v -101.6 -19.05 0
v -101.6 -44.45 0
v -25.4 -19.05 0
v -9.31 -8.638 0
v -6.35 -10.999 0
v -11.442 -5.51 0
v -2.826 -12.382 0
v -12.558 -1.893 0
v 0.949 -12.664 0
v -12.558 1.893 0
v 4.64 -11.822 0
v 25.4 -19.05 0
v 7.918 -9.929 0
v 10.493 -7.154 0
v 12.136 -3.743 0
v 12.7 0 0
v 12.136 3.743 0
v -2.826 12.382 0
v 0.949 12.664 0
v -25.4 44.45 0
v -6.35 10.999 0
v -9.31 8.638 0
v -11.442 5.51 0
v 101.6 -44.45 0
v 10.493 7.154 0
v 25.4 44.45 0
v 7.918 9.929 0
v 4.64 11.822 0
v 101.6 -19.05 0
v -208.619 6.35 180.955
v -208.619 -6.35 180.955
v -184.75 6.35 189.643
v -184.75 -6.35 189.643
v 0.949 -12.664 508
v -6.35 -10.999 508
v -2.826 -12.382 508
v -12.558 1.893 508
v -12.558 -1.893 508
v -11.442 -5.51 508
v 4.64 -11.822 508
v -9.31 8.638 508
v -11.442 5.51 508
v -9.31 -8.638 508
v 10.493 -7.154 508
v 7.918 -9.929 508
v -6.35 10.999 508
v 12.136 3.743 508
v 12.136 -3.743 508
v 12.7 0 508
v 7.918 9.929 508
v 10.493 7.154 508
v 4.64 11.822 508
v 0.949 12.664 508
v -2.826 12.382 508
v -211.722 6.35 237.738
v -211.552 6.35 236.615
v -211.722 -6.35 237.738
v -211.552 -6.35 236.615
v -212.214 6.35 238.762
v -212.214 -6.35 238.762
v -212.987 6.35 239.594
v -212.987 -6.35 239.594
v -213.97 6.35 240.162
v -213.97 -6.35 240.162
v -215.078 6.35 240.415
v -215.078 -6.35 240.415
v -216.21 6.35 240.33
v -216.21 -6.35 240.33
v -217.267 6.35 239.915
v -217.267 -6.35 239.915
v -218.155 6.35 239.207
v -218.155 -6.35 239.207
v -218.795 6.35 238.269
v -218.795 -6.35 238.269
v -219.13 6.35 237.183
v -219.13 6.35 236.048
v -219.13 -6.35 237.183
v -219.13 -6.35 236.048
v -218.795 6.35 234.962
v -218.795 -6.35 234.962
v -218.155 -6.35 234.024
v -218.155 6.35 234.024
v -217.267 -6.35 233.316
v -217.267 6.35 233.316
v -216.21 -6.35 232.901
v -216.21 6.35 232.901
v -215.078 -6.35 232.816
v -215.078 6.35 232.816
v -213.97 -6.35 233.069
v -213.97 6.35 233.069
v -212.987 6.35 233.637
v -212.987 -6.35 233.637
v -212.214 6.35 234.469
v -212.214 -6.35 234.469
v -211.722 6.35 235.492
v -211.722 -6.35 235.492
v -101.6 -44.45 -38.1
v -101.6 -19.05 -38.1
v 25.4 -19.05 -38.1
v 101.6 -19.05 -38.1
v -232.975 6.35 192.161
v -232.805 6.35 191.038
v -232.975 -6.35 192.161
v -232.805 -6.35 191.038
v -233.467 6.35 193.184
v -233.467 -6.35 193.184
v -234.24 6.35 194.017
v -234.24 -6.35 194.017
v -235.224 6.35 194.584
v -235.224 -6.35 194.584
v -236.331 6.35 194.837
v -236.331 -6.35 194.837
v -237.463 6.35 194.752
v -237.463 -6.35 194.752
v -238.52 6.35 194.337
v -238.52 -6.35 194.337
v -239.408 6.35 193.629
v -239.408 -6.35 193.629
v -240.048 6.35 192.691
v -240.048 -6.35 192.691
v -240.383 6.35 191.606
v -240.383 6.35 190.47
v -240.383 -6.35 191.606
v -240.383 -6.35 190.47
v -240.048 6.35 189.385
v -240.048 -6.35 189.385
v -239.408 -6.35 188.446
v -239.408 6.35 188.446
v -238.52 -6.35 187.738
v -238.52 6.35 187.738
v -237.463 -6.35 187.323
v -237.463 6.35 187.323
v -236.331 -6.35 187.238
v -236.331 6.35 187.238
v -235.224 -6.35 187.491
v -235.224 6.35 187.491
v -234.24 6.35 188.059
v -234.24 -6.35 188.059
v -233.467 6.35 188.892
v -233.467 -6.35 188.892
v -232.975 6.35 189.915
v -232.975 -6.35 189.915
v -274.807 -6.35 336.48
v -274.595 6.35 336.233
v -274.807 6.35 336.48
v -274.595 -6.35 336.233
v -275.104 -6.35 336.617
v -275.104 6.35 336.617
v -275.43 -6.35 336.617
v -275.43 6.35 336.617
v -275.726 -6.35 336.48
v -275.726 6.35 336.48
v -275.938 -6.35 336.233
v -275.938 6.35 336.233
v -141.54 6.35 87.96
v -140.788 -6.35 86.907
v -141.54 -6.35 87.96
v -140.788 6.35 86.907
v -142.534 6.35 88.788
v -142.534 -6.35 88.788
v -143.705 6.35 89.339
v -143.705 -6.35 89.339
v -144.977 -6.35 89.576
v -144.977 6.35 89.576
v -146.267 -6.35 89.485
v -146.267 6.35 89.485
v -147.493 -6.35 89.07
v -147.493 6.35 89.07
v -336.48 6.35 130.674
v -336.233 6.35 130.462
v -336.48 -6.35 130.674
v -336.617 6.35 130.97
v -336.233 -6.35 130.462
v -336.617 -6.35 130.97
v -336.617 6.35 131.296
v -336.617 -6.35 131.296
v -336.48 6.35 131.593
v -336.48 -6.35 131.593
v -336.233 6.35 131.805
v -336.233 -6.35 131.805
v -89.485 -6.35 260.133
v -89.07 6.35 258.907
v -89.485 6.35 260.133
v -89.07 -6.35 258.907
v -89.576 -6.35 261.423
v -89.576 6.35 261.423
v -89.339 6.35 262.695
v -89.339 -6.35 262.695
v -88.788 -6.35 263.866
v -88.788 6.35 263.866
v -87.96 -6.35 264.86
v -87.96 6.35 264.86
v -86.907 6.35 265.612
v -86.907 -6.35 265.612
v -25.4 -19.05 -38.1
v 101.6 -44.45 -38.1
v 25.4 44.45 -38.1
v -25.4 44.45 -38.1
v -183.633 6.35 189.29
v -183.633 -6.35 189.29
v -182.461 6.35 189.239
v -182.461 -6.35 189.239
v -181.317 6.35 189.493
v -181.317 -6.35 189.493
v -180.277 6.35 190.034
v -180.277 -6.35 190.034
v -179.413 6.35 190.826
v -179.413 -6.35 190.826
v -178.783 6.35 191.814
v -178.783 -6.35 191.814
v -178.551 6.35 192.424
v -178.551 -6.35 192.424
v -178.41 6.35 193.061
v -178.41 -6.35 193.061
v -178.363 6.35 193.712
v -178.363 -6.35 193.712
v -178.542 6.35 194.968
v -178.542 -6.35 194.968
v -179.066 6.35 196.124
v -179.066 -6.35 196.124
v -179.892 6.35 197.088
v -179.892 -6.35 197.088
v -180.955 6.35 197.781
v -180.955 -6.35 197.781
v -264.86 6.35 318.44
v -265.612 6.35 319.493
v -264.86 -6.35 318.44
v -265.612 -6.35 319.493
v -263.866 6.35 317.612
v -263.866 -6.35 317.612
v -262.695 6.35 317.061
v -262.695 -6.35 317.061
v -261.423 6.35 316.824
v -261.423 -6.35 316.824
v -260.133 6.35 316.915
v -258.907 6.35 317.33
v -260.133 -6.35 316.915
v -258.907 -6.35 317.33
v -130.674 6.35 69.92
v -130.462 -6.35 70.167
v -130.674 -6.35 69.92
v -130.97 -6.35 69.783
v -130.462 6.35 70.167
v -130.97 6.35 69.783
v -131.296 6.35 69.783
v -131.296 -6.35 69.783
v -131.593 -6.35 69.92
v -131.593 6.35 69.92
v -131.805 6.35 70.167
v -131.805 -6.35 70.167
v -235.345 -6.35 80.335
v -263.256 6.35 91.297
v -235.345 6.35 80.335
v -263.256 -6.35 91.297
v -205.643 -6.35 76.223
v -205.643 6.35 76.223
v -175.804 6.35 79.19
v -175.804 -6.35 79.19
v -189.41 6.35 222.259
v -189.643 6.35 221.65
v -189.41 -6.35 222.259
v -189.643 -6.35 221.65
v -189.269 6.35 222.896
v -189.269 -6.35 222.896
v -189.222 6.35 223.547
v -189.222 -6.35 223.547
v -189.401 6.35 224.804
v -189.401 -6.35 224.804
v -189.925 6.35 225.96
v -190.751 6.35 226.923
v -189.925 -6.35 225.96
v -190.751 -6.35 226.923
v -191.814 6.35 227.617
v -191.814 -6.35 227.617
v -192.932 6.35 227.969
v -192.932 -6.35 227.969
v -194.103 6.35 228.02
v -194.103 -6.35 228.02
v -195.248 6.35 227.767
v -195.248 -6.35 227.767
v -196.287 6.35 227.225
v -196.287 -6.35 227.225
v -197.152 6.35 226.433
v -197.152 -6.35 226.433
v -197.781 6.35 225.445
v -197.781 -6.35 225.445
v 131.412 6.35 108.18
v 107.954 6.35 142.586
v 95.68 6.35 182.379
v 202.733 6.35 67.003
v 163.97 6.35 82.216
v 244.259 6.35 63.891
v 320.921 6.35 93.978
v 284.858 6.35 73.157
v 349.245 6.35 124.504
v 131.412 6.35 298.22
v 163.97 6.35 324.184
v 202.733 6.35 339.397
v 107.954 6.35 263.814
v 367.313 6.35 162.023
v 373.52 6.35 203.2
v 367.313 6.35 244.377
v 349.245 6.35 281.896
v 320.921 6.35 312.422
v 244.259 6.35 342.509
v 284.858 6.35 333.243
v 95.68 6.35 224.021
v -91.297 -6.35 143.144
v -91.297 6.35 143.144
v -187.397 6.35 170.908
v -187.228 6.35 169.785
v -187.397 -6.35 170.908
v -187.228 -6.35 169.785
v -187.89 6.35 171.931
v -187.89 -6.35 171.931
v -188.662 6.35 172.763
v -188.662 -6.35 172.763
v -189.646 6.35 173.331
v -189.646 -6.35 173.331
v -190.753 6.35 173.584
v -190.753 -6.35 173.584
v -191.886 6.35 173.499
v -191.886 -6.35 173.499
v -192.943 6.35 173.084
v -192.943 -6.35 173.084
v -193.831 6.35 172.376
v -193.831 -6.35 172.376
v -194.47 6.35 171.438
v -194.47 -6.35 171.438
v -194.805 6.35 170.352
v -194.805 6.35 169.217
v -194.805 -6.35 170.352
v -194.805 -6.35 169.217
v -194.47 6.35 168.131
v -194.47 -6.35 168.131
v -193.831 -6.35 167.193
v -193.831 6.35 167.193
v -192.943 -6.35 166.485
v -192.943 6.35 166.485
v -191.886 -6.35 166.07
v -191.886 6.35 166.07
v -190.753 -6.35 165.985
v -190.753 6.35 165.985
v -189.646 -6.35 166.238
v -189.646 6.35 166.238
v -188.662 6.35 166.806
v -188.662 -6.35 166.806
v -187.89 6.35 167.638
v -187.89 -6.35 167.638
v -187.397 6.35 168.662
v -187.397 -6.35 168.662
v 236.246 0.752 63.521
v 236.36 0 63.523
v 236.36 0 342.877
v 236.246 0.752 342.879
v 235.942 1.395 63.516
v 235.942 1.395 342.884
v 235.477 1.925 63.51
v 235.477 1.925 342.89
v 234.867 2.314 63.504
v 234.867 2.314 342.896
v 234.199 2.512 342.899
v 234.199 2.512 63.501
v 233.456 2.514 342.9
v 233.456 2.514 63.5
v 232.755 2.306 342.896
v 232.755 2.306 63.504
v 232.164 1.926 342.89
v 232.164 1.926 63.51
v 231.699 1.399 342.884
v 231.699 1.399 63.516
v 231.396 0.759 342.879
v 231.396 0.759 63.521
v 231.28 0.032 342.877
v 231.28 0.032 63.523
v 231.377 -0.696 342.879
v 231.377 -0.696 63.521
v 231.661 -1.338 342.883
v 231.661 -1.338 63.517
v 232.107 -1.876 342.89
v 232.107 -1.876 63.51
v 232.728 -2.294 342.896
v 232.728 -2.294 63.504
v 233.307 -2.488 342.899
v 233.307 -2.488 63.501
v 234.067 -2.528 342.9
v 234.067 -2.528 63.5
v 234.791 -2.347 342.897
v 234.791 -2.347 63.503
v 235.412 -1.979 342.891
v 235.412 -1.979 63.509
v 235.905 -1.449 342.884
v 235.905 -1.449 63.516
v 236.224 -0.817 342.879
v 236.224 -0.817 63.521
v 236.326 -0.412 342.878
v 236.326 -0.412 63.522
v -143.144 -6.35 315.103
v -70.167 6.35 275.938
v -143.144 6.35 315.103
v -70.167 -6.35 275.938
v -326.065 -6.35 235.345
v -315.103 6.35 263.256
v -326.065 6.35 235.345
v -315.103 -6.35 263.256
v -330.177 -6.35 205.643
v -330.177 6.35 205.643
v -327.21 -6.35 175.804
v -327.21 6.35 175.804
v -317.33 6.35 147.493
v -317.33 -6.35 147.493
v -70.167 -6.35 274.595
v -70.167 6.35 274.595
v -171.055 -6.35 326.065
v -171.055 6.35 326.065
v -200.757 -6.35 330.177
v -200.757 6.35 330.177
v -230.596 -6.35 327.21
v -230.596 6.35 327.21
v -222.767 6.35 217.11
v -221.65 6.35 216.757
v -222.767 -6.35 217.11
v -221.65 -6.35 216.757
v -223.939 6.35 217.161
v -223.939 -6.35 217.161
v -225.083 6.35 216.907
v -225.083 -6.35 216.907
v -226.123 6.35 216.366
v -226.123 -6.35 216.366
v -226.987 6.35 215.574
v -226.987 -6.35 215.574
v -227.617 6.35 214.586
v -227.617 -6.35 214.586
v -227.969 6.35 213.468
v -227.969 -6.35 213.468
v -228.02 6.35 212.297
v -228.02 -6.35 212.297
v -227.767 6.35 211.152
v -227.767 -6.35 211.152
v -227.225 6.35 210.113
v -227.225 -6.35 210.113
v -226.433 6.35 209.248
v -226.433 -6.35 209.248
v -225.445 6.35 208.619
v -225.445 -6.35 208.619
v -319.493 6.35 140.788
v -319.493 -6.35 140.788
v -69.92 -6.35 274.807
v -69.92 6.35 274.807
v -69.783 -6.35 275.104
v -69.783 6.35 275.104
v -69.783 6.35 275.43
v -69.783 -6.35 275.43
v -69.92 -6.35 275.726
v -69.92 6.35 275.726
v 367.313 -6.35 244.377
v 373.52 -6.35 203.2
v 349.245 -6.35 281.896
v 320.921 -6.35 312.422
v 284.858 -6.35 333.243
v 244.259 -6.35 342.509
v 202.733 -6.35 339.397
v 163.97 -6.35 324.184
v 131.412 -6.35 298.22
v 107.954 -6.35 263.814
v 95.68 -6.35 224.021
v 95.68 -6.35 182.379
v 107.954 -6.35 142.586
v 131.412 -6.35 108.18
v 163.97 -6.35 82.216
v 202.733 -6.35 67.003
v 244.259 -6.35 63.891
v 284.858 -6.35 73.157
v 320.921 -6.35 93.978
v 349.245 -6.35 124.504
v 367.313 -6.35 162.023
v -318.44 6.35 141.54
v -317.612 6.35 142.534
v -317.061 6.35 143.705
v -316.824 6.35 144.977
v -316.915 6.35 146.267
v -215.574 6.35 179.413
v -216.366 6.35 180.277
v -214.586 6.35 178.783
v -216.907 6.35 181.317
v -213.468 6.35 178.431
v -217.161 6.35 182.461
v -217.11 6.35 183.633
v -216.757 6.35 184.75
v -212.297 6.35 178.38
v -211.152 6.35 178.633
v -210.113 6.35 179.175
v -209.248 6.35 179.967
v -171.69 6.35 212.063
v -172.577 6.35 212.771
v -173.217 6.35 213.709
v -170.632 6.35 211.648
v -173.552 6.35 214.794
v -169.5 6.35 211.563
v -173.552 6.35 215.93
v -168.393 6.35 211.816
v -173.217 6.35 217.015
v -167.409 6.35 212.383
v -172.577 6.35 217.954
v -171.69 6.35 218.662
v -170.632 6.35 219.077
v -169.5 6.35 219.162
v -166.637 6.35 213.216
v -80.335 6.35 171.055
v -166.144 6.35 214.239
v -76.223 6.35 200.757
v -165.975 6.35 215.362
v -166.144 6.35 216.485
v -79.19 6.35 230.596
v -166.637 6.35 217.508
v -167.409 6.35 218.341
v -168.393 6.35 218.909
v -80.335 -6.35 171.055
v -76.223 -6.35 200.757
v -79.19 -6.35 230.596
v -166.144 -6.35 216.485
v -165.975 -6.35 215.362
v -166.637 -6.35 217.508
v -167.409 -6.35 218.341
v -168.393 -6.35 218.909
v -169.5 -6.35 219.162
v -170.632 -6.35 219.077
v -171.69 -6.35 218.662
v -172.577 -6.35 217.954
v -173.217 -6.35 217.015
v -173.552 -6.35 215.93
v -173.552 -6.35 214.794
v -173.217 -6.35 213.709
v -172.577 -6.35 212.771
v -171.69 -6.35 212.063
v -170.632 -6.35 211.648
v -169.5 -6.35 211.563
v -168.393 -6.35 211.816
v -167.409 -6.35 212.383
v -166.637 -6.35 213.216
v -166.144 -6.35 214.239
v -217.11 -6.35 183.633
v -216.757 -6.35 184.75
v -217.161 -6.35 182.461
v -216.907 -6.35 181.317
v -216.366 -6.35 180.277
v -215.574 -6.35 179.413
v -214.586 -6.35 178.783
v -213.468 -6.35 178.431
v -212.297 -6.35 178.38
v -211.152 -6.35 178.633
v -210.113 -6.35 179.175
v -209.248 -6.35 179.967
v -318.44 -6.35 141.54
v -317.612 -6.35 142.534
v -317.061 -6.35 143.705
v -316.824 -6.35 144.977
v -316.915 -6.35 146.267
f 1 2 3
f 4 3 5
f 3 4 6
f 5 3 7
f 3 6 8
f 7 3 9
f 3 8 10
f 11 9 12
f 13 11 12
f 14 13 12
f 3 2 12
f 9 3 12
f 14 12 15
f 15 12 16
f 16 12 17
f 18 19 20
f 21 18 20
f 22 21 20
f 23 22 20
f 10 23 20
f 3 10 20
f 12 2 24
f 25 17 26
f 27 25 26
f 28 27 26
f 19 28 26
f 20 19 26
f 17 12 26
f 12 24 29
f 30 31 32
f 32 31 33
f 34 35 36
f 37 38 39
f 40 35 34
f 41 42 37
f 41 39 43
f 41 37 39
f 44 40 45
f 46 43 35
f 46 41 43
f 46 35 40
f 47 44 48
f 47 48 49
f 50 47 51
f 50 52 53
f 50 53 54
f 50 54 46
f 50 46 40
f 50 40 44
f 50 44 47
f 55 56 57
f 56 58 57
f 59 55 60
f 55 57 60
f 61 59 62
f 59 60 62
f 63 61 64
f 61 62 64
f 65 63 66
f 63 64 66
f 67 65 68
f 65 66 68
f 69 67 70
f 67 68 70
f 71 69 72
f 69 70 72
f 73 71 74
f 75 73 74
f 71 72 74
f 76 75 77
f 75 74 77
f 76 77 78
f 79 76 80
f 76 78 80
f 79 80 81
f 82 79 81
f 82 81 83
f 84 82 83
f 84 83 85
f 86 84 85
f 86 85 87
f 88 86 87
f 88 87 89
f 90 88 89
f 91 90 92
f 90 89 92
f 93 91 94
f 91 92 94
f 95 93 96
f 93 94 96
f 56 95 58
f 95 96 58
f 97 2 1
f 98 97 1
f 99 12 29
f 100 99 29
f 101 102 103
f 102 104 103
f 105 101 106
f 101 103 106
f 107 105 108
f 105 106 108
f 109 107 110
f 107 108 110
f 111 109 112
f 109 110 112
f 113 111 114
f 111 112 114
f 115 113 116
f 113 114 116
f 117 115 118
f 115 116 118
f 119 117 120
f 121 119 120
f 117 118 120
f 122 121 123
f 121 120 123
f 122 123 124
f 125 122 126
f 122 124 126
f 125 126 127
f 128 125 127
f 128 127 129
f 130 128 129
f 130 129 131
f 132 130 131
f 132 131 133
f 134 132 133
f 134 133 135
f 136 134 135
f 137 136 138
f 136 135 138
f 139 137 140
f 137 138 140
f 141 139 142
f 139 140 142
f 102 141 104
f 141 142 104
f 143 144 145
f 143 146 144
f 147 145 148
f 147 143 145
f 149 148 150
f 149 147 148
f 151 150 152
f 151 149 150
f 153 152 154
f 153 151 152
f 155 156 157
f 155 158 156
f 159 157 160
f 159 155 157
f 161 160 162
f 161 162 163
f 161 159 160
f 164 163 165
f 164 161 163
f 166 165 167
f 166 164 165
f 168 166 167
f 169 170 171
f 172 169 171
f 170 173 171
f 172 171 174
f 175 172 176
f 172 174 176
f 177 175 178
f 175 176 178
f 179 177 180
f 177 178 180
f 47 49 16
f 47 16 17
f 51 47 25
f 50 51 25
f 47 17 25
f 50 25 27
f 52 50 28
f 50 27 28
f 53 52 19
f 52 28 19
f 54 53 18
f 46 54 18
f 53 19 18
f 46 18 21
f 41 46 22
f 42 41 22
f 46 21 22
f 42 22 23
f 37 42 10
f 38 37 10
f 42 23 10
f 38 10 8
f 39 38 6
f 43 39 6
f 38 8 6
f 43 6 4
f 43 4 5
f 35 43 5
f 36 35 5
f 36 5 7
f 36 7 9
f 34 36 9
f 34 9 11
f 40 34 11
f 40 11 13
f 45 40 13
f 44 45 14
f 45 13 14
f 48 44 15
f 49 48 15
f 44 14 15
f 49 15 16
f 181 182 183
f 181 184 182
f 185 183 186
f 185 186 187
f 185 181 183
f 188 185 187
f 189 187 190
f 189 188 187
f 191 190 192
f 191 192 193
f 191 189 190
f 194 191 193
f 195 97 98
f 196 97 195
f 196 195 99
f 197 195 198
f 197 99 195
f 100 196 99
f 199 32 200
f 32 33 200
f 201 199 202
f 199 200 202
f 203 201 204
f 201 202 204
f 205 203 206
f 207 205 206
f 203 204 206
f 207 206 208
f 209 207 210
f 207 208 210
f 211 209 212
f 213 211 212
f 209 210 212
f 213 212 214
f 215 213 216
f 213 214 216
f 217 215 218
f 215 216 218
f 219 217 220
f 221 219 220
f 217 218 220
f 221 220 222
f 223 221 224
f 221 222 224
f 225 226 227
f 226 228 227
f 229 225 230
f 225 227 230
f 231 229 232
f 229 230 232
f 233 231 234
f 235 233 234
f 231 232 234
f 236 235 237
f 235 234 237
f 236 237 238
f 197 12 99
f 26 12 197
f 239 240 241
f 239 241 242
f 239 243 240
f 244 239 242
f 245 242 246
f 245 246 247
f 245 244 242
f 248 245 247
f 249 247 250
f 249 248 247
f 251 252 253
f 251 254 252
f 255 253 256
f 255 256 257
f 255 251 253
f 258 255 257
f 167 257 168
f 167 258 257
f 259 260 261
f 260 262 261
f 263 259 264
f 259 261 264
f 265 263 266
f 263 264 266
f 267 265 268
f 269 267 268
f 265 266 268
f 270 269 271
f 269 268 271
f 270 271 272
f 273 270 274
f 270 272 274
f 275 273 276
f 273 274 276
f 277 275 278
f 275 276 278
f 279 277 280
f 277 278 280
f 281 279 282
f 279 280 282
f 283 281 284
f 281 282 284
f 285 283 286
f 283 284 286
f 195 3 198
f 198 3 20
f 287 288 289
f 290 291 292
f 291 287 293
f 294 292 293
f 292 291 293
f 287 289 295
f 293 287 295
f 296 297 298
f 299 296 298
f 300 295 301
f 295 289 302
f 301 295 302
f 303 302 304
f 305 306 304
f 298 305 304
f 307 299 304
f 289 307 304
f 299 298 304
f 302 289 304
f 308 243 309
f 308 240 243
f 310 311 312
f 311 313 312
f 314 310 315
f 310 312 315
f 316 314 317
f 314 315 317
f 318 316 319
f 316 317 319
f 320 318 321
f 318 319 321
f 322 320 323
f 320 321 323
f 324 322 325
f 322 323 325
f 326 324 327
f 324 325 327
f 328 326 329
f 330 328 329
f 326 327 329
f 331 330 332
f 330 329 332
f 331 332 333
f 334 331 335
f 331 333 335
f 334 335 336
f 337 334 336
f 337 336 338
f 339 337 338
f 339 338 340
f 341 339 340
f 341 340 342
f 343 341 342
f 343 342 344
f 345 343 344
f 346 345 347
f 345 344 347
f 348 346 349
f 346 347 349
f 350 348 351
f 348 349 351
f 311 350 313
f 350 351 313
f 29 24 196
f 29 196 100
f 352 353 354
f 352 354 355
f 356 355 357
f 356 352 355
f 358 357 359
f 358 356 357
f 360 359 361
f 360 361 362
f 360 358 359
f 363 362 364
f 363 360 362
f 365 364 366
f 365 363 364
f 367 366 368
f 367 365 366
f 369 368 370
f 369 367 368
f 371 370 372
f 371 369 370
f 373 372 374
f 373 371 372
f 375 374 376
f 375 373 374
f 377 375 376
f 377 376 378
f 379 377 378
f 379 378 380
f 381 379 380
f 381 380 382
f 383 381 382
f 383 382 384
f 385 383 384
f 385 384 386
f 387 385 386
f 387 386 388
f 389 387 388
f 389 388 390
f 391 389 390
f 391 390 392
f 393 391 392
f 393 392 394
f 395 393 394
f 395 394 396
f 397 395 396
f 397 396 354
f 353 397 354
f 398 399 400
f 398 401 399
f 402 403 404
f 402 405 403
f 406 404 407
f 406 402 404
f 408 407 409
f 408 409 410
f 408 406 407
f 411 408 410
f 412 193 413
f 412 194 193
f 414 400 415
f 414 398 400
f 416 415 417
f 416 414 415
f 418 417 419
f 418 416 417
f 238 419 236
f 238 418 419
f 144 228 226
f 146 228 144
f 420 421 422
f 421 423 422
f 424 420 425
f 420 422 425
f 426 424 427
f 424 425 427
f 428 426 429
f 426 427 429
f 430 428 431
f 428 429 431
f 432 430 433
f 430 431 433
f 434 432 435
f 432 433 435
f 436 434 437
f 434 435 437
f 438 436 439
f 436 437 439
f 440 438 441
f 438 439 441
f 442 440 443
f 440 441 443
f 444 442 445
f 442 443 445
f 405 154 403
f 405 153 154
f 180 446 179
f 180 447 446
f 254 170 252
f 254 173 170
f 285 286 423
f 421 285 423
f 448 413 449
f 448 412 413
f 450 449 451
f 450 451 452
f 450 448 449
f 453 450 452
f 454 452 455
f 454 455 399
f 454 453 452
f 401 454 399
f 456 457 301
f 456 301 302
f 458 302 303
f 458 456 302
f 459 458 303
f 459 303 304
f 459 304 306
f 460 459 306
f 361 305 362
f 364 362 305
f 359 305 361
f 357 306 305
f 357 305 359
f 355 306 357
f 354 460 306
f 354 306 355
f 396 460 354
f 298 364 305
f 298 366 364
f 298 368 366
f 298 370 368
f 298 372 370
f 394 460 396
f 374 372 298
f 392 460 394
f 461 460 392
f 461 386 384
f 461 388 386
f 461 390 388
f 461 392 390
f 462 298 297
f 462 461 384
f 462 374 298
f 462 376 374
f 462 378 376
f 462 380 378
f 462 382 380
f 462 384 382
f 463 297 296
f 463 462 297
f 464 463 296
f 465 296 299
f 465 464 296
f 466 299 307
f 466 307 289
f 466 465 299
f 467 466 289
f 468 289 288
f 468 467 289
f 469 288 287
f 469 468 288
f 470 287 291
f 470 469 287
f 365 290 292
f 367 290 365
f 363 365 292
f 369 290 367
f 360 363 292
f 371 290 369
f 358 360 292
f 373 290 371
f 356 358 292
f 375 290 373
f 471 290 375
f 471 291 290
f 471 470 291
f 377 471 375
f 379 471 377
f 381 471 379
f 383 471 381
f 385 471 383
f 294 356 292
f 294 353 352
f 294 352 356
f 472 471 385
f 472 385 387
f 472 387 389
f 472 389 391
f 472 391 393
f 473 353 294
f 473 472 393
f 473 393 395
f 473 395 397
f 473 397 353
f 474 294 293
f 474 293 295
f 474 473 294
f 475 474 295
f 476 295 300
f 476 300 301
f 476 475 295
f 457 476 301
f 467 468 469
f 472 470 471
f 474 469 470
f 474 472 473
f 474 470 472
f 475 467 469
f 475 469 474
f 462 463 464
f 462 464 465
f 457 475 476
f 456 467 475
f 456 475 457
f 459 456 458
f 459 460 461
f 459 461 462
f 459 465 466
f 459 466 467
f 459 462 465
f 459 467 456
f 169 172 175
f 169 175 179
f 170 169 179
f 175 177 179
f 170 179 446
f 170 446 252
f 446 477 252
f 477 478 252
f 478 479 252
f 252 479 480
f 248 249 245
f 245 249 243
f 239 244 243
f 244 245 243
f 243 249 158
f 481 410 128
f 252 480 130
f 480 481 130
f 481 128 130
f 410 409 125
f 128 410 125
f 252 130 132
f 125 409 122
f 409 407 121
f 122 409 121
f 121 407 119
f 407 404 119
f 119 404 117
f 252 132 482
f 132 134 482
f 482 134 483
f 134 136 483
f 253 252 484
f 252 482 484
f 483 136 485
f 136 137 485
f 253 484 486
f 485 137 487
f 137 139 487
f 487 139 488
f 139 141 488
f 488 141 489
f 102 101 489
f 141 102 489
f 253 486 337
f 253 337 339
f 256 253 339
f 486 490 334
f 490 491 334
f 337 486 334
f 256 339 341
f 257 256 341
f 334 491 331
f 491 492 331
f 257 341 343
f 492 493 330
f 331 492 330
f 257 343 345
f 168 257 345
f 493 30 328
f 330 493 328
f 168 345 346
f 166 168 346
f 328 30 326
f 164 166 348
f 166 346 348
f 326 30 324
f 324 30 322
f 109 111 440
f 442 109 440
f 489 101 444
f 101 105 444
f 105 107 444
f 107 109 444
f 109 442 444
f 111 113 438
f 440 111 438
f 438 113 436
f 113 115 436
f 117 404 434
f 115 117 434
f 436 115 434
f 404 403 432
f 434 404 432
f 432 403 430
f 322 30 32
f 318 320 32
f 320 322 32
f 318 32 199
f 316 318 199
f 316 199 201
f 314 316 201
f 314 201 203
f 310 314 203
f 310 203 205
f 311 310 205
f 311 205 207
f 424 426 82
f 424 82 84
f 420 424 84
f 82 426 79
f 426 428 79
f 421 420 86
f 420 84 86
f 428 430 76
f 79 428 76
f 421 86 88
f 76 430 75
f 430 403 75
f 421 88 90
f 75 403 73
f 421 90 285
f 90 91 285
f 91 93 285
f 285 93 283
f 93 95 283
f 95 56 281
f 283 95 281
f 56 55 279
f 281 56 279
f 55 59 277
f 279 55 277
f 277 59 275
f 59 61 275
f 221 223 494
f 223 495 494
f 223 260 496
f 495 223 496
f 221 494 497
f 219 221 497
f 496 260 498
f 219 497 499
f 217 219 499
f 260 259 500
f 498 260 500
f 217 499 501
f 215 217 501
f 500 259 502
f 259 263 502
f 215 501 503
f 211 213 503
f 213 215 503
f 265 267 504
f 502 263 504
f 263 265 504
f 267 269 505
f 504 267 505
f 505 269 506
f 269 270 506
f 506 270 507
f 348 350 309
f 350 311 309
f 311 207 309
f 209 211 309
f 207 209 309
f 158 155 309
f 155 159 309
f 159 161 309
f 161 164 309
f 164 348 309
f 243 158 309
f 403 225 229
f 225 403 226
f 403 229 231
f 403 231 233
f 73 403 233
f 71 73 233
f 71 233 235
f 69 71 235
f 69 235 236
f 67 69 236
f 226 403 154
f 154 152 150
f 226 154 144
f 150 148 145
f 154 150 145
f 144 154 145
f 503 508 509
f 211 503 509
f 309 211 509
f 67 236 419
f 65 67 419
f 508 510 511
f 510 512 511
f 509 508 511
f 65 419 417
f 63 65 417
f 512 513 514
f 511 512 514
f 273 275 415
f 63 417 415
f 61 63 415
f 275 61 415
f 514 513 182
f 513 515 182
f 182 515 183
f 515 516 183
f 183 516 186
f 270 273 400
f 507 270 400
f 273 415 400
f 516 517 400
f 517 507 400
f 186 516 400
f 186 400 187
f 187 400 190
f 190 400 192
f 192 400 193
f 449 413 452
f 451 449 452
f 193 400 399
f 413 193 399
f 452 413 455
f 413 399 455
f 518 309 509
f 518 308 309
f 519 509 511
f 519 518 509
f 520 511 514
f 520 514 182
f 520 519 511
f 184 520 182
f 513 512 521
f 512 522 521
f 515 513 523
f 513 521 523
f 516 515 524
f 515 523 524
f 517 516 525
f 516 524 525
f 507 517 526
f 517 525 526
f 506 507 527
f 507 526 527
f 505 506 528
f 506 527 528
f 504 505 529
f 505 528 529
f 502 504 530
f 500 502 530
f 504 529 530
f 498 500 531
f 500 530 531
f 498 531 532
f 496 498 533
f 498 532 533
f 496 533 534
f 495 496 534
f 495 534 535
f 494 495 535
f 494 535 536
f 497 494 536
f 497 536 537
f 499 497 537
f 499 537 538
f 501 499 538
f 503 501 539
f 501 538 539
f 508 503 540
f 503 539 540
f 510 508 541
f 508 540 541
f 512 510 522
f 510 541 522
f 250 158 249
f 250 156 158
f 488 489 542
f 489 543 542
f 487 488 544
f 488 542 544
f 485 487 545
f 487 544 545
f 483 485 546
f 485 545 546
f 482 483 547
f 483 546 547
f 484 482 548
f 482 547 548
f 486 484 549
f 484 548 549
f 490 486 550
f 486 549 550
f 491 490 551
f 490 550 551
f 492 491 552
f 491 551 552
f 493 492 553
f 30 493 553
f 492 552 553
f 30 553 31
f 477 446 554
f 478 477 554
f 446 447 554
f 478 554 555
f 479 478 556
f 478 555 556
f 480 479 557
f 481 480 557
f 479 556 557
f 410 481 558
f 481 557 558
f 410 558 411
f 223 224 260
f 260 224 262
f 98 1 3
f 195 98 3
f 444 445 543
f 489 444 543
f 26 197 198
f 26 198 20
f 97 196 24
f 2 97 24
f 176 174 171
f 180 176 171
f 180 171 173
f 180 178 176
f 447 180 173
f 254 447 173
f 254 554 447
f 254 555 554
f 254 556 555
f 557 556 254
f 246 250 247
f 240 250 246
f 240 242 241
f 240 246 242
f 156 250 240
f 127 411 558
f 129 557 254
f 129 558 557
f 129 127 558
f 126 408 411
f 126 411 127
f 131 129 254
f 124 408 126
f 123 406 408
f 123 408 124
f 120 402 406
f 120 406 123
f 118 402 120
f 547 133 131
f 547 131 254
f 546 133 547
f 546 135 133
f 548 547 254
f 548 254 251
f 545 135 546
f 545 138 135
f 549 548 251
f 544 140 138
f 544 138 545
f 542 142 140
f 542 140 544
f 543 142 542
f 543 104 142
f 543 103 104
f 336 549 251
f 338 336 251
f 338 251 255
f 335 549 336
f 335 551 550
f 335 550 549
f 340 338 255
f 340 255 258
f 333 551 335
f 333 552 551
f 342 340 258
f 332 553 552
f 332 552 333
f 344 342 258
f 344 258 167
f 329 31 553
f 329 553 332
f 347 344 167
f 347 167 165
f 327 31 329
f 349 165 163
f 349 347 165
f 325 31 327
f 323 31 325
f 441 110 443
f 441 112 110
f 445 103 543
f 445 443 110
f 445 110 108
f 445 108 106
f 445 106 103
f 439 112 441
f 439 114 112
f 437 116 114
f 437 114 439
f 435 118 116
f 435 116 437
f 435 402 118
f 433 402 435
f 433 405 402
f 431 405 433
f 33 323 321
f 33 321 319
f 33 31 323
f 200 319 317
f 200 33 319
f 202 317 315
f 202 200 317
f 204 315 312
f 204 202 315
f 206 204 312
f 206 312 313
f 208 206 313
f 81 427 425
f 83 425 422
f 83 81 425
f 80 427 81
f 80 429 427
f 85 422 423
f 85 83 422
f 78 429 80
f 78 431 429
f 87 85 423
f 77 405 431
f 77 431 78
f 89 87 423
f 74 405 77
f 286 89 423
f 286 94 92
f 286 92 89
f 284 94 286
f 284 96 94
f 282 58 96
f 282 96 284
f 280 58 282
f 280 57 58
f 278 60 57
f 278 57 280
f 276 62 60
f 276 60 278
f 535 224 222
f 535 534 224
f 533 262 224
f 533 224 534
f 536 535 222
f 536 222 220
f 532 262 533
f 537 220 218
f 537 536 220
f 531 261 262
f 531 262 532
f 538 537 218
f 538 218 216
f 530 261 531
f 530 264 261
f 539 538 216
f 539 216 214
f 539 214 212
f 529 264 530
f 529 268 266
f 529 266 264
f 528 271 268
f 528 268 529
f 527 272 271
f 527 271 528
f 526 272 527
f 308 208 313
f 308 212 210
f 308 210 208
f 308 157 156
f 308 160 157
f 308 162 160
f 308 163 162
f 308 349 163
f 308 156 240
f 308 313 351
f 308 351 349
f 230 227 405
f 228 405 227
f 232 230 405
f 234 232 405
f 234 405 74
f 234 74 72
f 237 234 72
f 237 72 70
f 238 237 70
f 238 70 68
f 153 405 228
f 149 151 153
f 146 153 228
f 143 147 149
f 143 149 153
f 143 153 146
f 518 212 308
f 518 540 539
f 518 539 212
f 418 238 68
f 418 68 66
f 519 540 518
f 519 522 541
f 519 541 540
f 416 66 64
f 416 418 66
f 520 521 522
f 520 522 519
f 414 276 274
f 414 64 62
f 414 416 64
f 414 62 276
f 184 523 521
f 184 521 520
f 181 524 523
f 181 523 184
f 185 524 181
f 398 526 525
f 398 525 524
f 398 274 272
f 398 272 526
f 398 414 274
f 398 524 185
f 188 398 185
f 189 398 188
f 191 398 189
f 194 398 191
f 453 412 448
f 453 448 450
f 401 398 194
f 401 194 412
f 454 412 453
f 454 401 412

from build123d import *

# Parameters (mm, degrees)
F1_DEPTH      = 6.35
F2_R          = 3.81
F3_DEPTH      = 6.351
F3_DEPTH_BACK = 6.351
F4_R          = 5.08
F5_R          = 0.762
F6_R          = 139.7
F7_DEPTH      = 6.35
F8_R          = 12.7
F9_DEPTH      = 508
F10_W         = 88.9
F10_H         = 38.1
F11_DEPTH     = 101.6
F12_R         = 2.54
F13_DEPTH     = 508.001
F14_W         = 76.2
F14_H         = 63.5
F15_DEPTH     = 38.101


with BuildPart() as f1:
    # F0 (on Front) → F1 (new body, symmetric)
    with BuildSketch(Plane.XZ):
        with BuildLine():
            ThreePointArc((-91.2968271065, 143.1443599954), (-76.2, 203.2), (-91.2968271065, 263.2556400046))
            Line((-91.2968271065, 263.2556400046), (-68.9161925278, 275.2667680055))
            Line((-68.9161925278, 275.2667680055), (-143.1443599954, 315.1031728935))
            ThreePointArc((-143.1443599954, 315.1031728935), (-203.2, 330.2), (-263.2556400046, 315.1031728935))
            Line((-263.2556400046, 315.1031728935), (-275.2667680055, 337.4838074722))
            Line((-275.2667680055, 337.4838074722), (-315.1031728935, 263.2556400046))
            ThreePointArc((-315.1031728935, 263.2556400046), (-330.2, 203.2), (-315.1031728935, 143.1443599954))
            Line((-315.1031728935, 143.1443599954), (-337.4838074722, 131.1332319945))
            Line((-337.4838074722, 131.1332319945), (-263.2556400046, 91.2968271065))
            ThreePointArc((-263.2556400046, 91.2968271065), (-203.2, 76.2), (-143.1443599954, 91.2968271065))
            Line((-143.1443599954, 91.2968271065), (-131.1332319945, 68.9161925278))
            Line((-131.1332319945, 68.9161925278), (-91.2968271065, 143.1443599954))
        make_face()
    extrude(amount=F1_DEPTH, both=True)

    # F2 (on Front) → F3 (cut, two sides)
    with BuildSketch(Plane.XZ) as f3_sk:
        with BuildLine():
            ThreePointArc((-221.6495800143, 216.7574886057), (-225.0829043731, 216.9073907845), (-227.6166281563, 214.5856606956))
            Line((-227.6166281563, 214.5856606956), (-221.6495800143, 216.7574886057))
        make_face()
        with BuildLine():
            Line((-221.6495800143, 216.7574886057), (-227.6166281563, 214.5856606956))
            Line((-227.6166281563, 214.5856606956), (-225.4448002462, 208.6186125536))
            ThreePointArc((-225.4448002462, 208.6186125536), (-221.1346460819, 208.9011149828), (-219.0570620697, 212.6880505797))
            ThreePointArc((-219.0570620697, 212.6880505797), (-219.7602545334, 215.100594628), (-221.6495800143, 216.7574886057))
        make_face()
        with BuildLine():
            Line((-225.4448002462, 208.6186125536), (-227.6166281563, 214.5856606956))
            ThreePointArc((-227.6166281563, 214.5856606956), (-227.7665303351, 211.1523363369), (-225.4448002462, 208.6186125536))
        make_face()
        with BuildLine():
            Line((-197.7813874464, 225.4448002462), (-221.6495800143, 216.7574886057))
            ThreePointArc((-221.6495800143, 216.7574886057), (-219.7602545334, 215.100594628), (-219.0570620697, 212.6880505797))
            ThreePointArc((-219.0570620697, 212.6880505797), (-221.1346460819, 208.9011149828), (-225.4448002462, 208.6186125536))
            Line((-225.4448002462, 208.6186125536), (-216.7574886057, 184.7504199857))
            ThreePointArc((-216.7574886057, 184.7504199857), (-211.7162089957, 187.2365039667), (-208.1979225191, 182.8528098697))
            ThreePointArc((-208.1979225191, 182.8528098697), (-208.3043564827, 181.8809682858), (-208.6186125536, 180.9551997538))
            Line((-208.6186125536, 180.9551997538), (-184.7504199857, 189.6425113943))
            ThreePointArc((-184.7504199857, 189.6425113943), (-186.9222478958, 195.6095595363), (-180.9551997538, 197.7813874464))
            Line((-180.9551997538, 197.7813874464), (-189.6425113943, 221.6495800143))
            ThreePointArc((-189.6425113943, 221.6495800143), (-195.6095595363, 219.4777521042), (-197.7813874464, 225.4448002462))
        make_face()
        with BuildLine():
            ThreePointArc((-191.8143393044, 227.6166281563), (-195.2476636631, 227.7665303351), (-197.7813874464, 225.4448002462))
            Line((-197.7813874464, 225.4448002462), (-191.8143393044, 227.6166281563))
        make_face()
        with BuildLine():
            Line((-191.8143393044, 227.6166281563), (-197.7813874464, 225.4448002462))
            ThreePointArc((-197.7813874464, 225.4448002462), (-195.6095595363, 219.4777521042), (-189.6425113943, 221.6495800143))
            Line((-189.6425113943, 221.6495800143), (-191.8143393044, 227.6166281563))
        make_face()
        with BuildLine():
            ThreePointArc((-208.1979225191, 182.8528098697), (-211.7162089957, 187.2365039667), (-216.7574886057, 184.7504199857))
            Line((-216.7574886057, 184.7504199857), (-214.5856606956, 178.7833718437))
            Line((-214.5856606956, 178.7833718437), (-208.6186125536, 180.9551997538))
            ThreePointArc((-208.6186125536, 180.9551997538), (-208.3043564827, 181.8809682858), (-208.1979225191, 182.8528098697))
        make_face()
        with BuildLine():
            Line((-214.5856606956, 178.7833718437), (-216.7574886057, 184.7504199857))
            ThreePointArc((-216.7574886057, 184.7504199857), (-216.9073907845, 181.3170956269), (-214.5856606956, 178.7833718437))
        make_face()
        with BuildLine():
            ThreePointArc((-189.2218213598, 223.5471901303), (-189.9250138235, 225.9597341786), (-191.8143393044, 227.6166281563))
            Line((-191.8143393044, 227.6166281563), (-189.6425113943, 221.6495800143))
            ThreePointArc((-189.6425113943, 221.6495800143), (-189.3282553234, 222.5753485463), (-189.2218213598, 223.5471901303))
        make_face()
        with BuildLine():
            Line((-208.6186125536, 180.9551997538), (-214.5856606956, 178.7833718437))
            ThreePointArc((-214.5856606956, 178.7833718437), (-211.1523363369, 178.6334696649), (-208.6186125536, 180.9551997538))
        make_face()
        with BuildLine():
            ThreePointArc((-178.3626818092, 193.7119494203), (-179.0658742729, 196.1244934687), (-180.9551997538, 197.7813874464))
            Line((-180.9551997538, 197.7813874464), (-178.7833718437, 191.8143393044))
            ThreePointArc((-178.7833718437, 191.8143393044), (-178.4691157728, 192.7401078364), (-178.3626818092, 193.7119494203))
        make_face()
        with BuildLine():
            Line((-178.7833718437, 191.8143393044), (-180.9551997538, 197.7813874464))
            ThreePointArc((-180.9551997538, 197.7813874464), (-186.9222478958, 195.6095595363), (-184.7504199857, 189.6425113943))
            Line((-184.7504199857, 189.6425113943), (-178.7833718437, 191.8143393044))
        make_face()
        with BuildLine():
            ThreePointArc((-184.7504199857, 189.6425113943), (-181.3170956269, 189.4926092155), (-178.7833718437, 191.8143393044))
            Line((-178.7833718437, 191.8143393044), (-184.7504199857, 189.6425113943))
        make_face()
        with Locations((-169.7845304049, 215.3622362967)):
            Circle(F2_R)
        with Locations((-215.3622362967, 236.6154695951)):
            Circle(F2_R)
        with Locations((-236.6154695951, 191.0377637033)):
            Circle(F2_R)
        with Locations((-191.0377637033, 169.7845304049)):
            Circle(F2_R)
    extrude(amount=-F3_DEPTH, mode=Mode.SUBTRACT)
    extrude(f3_sk.sketch, amount=F3_DEPTH_BACK, mode=Mode.SUBTRACT)

    # F4
    f4_edges = [f1.edges().sort_by_distance(p)[0] for p in [
        (-263.25564, 0, 315.103173),
        (-91.296827, 0, 263.25564),
        (-143.14436, 0, 91.296827),
        (-315.103173, 0, 143.14436),
    ]]
    fillet(f4_edges, radius=F4_R)

    # F5
    f5_edges = [f1.edges().sort_by_distance(p)[0] for p in [
        (-337.483807, 0, 131.133232),
        (-131.133232, 0, 68.916193),
        (-68.916193, 0, 275.266768),
        (-275.266768, 0, 337.483807),
    ]]
    fillet(f5_edges, radius=F5_R)


with BuildPart() as f7:
    # F6 (on Front) → F7 (new body, symmetric)
    with BuildSketch(Plane.XZ):
        with Locations((233.8195346139, 203.2)):
            Circle(F6_R)
    extrude(amount=F7_DEPTH, both=True)

    # F12 (on Top) → F13 (cut, through all)
    with BuildSketch(Plane.XY):
        with Locations((233.8195346139, 0)):
            Circle(F12_R)
    extrude(amount=F13_DEPTH, mode=Mode.SUBTRACT)


with BuildPart() as f9:
    # F8 (on Top) → F9 (new body)
    with BuildSketch(Plane.XY):
        Circle(F8_R)
    extrude(amount=F9_DEPTH)

    # F10 (on Right) → F11 (join, symmetric)
    with BuildSketch(Plane.YZ):
        with Locations((0, -19.05)):
            Rectangle(F10_W, F10_H)
    extrude(amount=F11_DEPTH, both=True)

    # F14 (on face) → F15 (cut, through all)
    with BuildSketch(Plane.XY):
        with Locations((-63.5, 12.7)):
            Rectangle(F14_W, F14_H)
        with Locations((63.5, 12.7)):
            Rectangle(F14_W, F14_H)
    extrude(amount=-F15_DEPTH, mode=Mode.SUBTRACT)


solid = Compound([f1.part, f7.part, f9.part])
